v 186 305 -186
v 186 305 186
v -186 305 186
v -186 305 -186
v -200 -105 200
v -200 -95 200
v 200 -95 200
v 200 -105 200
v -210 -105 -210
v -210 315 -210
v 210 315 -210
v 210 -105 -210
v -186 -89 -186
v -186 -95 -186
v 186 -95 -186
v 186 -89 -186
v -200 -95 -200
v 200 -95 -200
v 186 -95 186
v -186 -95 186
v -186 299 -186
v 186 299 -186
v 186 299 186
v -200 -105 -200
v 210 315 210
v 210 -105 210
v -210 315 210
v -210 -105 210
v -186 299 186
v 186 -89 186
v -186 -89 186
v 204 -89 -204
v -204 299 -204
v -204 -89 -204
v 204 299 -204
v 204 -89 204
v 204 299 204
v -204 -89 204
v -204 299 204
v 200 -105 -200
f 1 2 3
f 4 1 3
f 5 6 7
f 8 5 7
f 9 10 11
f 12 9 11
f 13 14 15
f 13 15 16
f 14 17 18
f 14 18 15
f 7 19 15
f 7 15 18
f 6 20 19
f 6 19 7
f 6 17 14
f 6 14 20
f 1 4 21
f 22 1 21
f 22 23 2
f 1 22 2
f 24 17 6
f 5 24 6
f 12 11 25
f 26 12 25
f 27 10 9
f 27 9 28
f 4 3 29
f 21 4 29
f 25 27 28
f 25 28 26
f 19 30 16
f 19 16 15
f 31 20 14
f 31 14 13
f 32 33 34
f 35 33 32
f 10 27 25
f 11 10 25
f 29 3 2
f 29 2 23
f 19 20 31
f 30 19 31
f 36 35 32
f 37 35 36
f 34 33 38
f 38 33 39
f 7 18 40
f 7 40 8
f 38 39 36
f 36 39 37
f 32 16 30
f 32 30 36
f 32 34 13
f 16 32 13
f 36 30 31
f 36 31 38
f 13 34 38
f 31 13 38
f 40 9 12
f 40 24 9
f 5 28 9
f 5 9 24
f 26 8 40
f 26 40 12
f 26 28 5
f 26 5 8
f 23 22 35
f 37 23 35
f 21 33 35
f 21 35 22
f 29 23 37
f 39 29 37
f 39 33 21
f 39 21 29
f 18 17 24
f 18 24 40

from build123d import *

# Parameters (mm, degrees)
F0_W      = 420
F0_H      = 420
F1_DEPTH  = 105
F2_T      = -6
F3_W      = 6
F3_H      = 408
F4_DEPTH  = 18
F5_W      = 6
F5_H      = 408
F6_DEPTH  = 18
F7_W      = 6
F7_H      = 18
F8_DEPTH  = 372
F9_W      = 6
F9_H      = 18
F10_DEPTH = 372
F11_W     = 408
F11_H     = 408
F11_W_2   = 400
F11_H_2   = 400
F12_DEPTH = 10
F14_DEPTH = 25.4
F15_W     = 400
F15_H     = 400
F16_DEPTH = 10


with BuildPart() as f1:
    # F0 (on Front) → F1 (new body, symmetric)
    with BuildSketch(Plane.XZ):
        Rectangle(F0_W, F0_H)
    extrude(amount=F1_DEPTH, both=True)

    # F2
    f2_openings = [f1.faces().sort_by_distance(p)[0] for p in [
        (0, -105, 0),
    ]]
    offset(amount=F2_T, openings=f2_openings)

    # F3 (on face) → F4 (join)
    with BuildSketch(Plane.YZ.offset(-204)):
        with Locations((-92, 0)):
            Rectangle(F3_W, F3_H)
    extrude(amount=F4_DEPTH)

    # F5 (on face) → F6 (join)
    with BuildSketch(Plane(origin=(204, 0, 0), x_dir=(0, -1, 0), z_dir=(-1, 0, 0))):
        with Locations((92, 0)):
            Rectangle(F5_W, F5_H)
    extrude(amount=F6_DEPTH)

    # F7 (on face) → F8 (join, through all)
    with BuildSketch(Plane.YZ.offset(-186)):
        with Locations((-92, 195)):
            Rectangle(F7_W, F7_H)
    extrude(amount=F8_DEPTH)

    # F9 (on face) → F10 (join, through all)
    with BuildSketch(Plane.YZ.offset(-186)):
        with Locations((-92, -195)):
            Rectangle(F9_W, F9_H)
    extrude(amount=F10_DEPTH)

    # F11 (on face) → F12 (join)
    with BuildSketch(Plane.XZ.offset(95)):
        Rectangle(F11_W, F11_H)
        Rectangle(F11_W_2, F11_H_2, mode=Mode.SUBTRACT)
    extrude(amount=F12_DEPTH)

    # F13: F1 across face


with BuildPart() as f1_1:
    add(f1.part)
    add(f1.part.mirror(Plane(origin=(0, 105, 0), x_dir=(1, 0, 0), z_dir=(0, 1, 0))))

    # F14 (cut): a face of the model
    f14_faces = [f1_1.faces().sort_by_distance(p)[0] for p in [
        (0, 111, 0),
    ]]
    extrude(f14_faces, amount=-F14_DEPTH, mode=Mode.SUBTRACT)

    # F15 (on face) → F16 (join)
    with BuildSketch(Plane(origin=(0, 305, 0), x_dir=(-1, 0, 0), z_dir=(0, 1, 0))):
        Rectangle(F15_W, F15_H)
    extrude(amount=F16_DEPTH)


solid = f1_1.part
